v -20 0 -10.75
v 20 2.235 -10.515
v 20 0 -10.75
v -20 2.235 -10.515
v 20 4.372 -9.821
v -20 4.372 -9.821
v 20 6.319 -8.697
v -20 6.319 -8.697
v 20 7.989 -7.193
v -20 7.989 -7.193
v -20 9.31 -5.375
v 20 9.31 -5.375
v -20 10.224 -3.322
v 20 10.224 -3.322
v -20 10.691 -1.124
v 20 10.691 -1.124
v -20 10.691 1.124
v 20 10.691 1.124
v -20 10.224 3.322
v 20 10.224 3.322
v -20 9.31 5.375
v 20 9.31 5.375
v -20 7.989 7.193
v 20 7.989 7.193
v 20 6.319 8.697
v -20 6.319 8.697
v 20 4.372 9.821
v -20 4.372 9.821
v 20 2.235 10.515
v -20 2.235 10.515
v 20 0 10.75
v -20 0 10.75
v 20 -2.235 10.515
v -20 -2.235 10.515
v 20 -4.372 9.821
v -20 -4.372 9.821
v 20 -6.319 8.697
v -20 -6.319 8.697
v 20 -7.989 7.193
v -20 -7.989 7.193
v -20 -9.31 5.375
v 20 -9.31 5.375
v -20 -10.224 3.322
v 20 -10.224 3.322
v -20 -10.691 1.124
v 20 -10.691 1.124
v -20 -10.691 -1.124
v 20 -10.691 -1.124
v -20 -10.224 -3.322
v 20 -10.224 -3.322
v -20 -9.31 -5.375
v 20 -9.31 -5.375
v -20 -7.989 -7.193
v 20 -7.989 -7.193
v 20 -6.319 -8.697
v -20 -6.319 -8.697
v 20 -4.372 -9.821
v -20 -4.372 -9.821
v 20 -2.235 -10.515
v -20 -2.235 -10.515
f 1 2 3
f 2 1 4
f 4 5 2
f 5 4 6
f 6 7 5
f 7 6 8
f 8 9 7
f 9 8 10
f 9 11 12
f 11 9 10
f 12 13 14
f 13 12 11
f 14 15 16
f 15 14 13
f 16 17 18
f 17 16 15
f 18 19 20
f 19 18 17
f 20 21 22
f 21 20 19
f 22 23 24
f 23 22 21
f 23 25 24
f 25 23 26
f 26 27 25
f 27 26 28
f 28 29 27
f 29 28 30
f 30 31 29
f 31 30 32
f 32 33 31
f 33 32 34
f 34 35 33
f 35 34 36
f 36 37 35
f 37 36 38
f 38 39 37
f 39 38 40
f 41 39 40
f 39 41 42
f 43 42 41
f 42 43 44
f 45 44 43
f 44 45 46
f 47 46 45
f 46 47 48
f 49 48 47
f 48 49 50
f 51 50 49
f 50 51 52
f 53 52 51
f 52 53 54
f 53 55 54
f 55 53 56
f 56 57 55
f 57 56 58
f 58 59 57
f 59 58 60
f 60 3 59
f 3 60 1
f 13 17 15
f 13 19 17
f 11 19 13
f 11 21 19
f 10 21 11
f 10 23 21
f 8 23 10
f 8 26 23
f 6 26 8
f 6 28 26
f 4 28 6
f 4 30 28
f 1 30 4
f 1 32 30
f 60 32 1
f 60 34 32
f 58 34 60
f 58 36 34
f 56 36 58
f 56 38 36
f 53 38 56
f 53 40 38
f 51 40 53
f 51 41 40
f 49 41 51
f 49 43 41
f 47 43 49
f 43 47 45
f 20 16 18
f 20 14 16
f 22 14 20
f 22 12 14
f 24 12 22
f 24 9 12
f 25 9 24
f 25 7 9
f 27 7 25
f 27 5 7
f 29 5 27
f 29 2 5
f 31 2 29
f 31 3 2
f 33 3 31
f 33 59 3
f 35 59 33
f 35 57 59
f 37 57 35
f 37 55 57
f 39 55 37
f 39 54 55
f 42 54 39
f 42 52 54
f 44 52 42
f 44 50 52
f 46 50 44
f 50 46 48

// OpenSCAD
// RollerDog End Cap

arm_length=15;
nut_size=7.75;
bolt_diameter=4.75;
cube_size=32;
top_lip_height=8;
lip_width=10;
wheel_bolt_diameter=18;
bearing_diameter=22.5;
edge_room=3;
pipe_diameter=21.5;
tooth_count = 24;


module pvc_pipe() {
	rotate([0,90,0])
		cylinder(d=pipe_diameter,h=40,center=true);
}

module end_cap() {
	pvc_pipe();
}

end_cap();
